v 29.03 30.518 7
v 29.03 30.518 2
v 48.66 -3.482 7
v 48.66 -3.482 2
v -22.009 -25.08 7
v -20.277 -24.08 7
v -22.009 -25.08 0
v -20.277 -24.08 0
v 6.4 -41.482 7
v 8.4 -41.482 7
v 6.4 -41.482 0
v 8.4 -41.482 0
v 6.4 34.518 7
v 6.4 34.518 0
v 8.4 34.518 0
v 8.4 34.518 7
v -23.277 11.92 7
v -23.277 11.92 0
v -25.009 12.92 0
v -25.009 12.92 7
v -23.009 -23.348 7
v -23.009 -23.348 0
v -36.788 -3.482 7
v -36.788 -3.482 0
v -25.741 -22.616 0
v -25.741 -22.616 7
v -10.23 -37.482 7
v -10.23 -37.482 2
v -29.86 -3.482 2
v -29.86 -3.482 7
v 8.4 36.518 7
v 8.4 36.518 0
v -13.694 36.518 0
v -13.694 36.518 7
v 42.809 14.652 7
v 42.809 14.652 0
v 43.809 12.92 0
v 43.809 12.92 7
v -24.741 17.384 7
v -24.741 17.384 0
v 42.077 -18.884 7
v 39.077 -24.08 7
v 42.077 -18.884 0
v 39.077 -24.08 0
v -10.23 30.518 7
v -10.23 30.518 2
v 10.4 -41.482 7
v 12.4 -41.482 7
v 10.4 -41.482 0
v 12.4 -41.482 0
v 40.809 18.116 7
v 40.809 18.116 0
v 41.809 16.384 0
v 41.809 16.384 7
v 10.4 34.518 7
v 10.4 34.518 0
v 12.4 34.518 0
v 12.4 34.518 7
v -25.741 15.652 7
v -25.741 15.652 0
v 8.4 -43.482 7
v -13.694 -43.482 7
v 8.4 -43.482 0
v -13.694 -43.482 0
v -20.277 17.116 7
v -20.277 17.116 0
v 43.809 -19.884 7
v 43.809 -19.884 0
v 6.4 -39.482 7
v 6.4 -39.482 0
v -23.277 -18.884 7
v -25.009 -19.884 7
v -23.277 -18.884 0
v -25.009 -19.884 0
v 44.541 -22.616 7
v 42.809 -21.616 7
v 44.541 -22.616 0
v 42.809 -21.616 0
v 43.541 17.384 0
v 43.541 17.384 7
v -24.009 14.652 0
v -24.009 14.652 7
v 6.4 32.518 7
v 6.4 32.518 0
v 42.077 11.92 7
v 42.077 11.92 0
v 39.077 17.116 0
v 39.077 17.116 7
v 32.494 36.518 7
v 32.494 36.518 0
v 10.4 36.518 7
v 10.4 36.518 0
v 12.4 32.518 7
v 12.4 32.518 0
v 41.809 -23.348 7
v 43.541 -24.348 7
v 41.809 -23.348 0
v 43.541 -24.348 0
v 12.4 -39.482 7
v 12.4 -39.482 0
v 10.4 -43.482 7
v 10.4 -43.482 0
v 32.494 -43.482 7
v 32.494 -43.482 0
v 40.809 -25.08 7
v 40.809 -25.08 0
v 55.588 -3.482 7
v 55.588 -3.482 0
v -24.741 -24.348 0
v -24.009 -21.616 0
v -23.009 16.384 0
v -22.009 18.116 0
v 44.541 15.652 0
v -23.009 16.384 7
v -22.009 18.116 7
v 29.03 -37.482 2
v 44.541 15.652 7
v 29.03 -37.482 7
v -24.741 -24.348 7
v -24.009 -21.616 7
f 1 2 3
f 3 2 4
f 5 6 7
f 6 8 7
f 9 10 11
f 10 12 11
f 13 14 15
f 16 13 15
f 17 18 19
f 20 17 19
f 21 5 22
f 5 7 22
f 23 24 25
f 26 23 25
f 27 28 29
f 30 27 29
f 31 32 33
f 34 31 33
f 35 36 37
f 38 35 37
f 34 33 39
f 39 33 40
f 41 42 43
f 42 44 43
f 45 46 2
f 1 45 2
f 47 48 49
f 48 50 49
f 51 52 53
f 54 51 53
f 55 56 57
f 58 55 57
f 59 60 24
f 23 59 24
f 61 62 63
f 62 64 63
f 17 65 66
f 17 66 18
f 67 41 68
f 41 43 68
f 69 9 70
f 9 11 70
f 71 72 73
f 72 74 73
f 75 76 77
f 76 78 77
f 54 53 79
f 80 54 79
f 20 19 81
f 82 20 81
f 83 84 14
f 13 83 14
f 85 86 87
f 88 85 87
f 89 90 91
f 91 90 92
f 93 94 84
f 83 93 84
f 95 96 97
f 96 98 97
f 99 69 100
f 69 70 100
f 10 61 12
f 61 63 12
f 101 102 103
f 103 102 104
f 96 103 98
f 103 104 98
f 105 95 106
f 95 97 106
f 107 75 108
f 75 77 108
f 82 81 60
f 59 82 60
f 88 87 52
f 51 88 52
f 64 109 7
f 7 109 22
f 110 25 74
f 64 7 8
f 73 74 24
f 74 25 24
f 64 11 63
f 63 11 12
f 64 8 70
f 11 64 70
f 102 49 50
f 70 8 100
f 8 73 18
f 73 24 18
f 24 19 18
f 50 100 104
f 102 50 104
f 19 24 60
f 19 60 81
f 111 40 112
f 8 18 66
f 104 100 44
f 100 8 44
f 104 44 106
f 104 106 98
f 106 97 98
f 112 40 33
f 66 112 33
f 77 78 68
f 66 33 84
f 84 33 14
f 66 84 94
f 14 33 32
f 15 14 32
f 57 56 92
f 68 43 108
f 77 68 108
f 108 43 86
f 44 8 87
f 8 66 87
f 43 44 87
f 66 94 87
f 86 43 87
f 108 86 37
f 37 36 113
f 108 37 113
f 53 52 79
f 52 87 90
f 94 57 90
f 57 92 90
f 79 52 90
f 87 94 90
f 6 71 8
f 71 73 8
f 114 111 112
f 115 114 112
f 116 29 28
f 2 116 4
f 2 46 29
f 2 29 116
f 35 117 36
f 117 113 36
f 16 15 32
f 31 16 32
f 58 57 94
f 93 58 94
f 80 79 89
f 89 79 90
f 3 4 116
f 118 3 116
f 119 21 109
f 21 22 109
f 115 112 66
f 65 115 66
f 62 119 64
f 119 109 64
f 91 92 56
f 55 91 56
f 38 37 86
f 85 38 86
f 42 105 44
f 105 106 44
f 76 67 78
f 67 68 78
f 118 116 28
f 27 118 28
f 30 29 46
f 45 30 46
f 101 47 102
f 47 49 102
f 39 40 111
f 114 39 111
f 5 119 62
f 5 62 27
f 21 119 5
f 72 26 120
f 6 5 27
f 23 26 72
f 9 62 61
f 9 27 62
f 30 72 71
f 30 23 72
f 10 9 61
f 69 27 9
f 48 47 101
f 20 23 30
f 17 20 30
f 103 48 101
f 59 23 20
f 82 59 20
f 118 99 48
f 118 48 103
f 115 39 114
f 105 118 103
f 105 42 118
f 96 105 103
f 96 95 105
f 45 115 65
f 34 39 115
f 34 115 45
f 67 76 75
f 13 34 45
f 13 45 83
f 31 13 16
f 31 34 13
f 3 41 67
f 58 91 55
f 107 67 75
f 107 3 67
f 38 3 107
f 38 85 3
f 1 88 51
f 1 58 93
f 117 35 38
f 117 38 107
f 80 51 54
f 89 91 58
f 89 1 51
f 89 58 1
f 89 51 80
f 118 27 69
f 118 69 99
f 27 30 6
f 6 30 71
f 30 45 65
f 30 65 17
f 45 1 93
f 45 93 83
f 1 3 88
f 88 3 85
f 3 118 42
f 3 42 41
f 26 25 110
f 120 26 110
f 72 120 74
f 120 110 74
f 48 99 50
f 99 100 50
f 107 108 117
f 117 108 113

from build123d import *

# Parameters (mm, degrees)
F1_DEPTH = 2
F3_DEPTH = 5


with BuildPart() as f1:
    # F0 (on Top) → F1 (new body)
    with BuildSketch(Plane.XY):
        Polygon((-24.740927, -24.347703), (-13.693921, -43.481678), (8.400089, -43.481678), (8.400089, -41.481678), (6.400089, -41.481678), (6.400089, -39.481678), (12.400089, -39.481678), (12.400089, -41.481678), (10.400089, -41.481678), (10.400089, -43.481678), (32.4941, -43.481678), (43.541105, -24.347703), (41.809055, -23.347703), (40.809055, -25.079754), (39.077004, -24.079754), (42.077004, -18.883602), (43.809055, -19.883602), (42.809055, -21.615652), (44.541105, -22.615652), (55.588111, -3.481678), (44.541105, 15.652297), (42.809055, 14.652297), (43.809055, 12.920246), (42.077004, 11.920246), (39.077004, 17.116398), (40.809055, 18.116398), (41.809055, 16.384348), (43.541105, 17.384348), (32.4941, 36.518322), (10.400089, 36.518322), (10.400089, 34.518322), (12.400089, 34.518322), (12.400089, 32.518322), (6.400089, 32.518322), (6.400089, 34.518322), (8.400089, 34.518322), (8.400089, 36.518322), (-13.693921, 36.518322), (-24.740927, 17.384348), (-23.008876, 16.384348), (-22.008876, 18.116398), (-20.276825, 17.116398), (-23.276825, 11.920246), (-25.008876, 12.920246), (-24.008876, 14.652297), (-25.740927, 15.652297), (-36.787932, -3.481678), (-25.740927, -22.615652), (-24.008876, -21.615652), (-25.008876, -19.883602), (-23.276825, -18.883602), (-20.276825, -24.079754), (-22.008876, -25.079754), (-23.008876, -23.347703), align=None)
    extrude(amount=F1_DEPTH)

    # F2 (on face) → F3 (join)
    with BuildSketch(Plane.XY.offset(2)):
        Polygon((-25.740927, -22.615652), (-24.008876, -21.615652), (-25.008876, -19.883602), (-23.276825, -18.883602), (-20.276825, -24.079754), (-22.008876, -25.079754), (-23.008876, -23.347703), (-24.740927, -24.347703), (-13.693921, -43.481678), (8.400089, -43.481678), (8.400089, -41.481678), (6.400089, -41.481678), (6.400089, -39.481678), (12.400089, -39.481678), (12.400089, -41.481678), (10.400089, -41.481678), (10.400089, -43.481678), (32.4941, -43.481678), (43.541105, -24.347703), (41.809055, -23.347703), (40.809055, -25.079754), (39.077004, -24.079754), (42.077004, -18.883602), (43.809055, -19.883602), (42.809055, -21.615652), (44.541105, -22.615652), (55.588111, -3.481678), (44.541105, 15.652297), (42.809055, 14.652297), (43.809055, 12.920246), (42.077004, 11.920246), (39.077004, 17.116398), (40.809055, 18.116398), (41.809055, 16.384348), (43.541105, 17.384348), (32.4941, 36.518322), (10.400089, 36.518322), (10.400089, 34.518322), (12.400089, 34.518322), (12.400089, 32.518322), (6.400089, 32.518322), (6.400089, 34.518322), (8.400089, 34.518322), (8.400089, 36.518322), (-13.693921, 36.518322), (-24.740927, 17.384348), (-23.008876, 16.384348), (-22.008876, 18.116398), (-20.276825, 17.116398), (-23.276825, 11.920246), (-25.008876, 12.920246), (-24.008876, 14.652297), (-25.740927, 15.652297), (-36.787932, -3.481678), align=None)
        Polygon((-10.22982, -37.481678), (-29.859729, -3.481678), (-10.22982, 30.518322), (29.029998, 30.518322), (48.659908, -3.481678), (29.029998, -37.481678), align=None, mode=Mode.SUBTRACT)
    extrude(amount=F3_DEPTH)


solid = f1.part
